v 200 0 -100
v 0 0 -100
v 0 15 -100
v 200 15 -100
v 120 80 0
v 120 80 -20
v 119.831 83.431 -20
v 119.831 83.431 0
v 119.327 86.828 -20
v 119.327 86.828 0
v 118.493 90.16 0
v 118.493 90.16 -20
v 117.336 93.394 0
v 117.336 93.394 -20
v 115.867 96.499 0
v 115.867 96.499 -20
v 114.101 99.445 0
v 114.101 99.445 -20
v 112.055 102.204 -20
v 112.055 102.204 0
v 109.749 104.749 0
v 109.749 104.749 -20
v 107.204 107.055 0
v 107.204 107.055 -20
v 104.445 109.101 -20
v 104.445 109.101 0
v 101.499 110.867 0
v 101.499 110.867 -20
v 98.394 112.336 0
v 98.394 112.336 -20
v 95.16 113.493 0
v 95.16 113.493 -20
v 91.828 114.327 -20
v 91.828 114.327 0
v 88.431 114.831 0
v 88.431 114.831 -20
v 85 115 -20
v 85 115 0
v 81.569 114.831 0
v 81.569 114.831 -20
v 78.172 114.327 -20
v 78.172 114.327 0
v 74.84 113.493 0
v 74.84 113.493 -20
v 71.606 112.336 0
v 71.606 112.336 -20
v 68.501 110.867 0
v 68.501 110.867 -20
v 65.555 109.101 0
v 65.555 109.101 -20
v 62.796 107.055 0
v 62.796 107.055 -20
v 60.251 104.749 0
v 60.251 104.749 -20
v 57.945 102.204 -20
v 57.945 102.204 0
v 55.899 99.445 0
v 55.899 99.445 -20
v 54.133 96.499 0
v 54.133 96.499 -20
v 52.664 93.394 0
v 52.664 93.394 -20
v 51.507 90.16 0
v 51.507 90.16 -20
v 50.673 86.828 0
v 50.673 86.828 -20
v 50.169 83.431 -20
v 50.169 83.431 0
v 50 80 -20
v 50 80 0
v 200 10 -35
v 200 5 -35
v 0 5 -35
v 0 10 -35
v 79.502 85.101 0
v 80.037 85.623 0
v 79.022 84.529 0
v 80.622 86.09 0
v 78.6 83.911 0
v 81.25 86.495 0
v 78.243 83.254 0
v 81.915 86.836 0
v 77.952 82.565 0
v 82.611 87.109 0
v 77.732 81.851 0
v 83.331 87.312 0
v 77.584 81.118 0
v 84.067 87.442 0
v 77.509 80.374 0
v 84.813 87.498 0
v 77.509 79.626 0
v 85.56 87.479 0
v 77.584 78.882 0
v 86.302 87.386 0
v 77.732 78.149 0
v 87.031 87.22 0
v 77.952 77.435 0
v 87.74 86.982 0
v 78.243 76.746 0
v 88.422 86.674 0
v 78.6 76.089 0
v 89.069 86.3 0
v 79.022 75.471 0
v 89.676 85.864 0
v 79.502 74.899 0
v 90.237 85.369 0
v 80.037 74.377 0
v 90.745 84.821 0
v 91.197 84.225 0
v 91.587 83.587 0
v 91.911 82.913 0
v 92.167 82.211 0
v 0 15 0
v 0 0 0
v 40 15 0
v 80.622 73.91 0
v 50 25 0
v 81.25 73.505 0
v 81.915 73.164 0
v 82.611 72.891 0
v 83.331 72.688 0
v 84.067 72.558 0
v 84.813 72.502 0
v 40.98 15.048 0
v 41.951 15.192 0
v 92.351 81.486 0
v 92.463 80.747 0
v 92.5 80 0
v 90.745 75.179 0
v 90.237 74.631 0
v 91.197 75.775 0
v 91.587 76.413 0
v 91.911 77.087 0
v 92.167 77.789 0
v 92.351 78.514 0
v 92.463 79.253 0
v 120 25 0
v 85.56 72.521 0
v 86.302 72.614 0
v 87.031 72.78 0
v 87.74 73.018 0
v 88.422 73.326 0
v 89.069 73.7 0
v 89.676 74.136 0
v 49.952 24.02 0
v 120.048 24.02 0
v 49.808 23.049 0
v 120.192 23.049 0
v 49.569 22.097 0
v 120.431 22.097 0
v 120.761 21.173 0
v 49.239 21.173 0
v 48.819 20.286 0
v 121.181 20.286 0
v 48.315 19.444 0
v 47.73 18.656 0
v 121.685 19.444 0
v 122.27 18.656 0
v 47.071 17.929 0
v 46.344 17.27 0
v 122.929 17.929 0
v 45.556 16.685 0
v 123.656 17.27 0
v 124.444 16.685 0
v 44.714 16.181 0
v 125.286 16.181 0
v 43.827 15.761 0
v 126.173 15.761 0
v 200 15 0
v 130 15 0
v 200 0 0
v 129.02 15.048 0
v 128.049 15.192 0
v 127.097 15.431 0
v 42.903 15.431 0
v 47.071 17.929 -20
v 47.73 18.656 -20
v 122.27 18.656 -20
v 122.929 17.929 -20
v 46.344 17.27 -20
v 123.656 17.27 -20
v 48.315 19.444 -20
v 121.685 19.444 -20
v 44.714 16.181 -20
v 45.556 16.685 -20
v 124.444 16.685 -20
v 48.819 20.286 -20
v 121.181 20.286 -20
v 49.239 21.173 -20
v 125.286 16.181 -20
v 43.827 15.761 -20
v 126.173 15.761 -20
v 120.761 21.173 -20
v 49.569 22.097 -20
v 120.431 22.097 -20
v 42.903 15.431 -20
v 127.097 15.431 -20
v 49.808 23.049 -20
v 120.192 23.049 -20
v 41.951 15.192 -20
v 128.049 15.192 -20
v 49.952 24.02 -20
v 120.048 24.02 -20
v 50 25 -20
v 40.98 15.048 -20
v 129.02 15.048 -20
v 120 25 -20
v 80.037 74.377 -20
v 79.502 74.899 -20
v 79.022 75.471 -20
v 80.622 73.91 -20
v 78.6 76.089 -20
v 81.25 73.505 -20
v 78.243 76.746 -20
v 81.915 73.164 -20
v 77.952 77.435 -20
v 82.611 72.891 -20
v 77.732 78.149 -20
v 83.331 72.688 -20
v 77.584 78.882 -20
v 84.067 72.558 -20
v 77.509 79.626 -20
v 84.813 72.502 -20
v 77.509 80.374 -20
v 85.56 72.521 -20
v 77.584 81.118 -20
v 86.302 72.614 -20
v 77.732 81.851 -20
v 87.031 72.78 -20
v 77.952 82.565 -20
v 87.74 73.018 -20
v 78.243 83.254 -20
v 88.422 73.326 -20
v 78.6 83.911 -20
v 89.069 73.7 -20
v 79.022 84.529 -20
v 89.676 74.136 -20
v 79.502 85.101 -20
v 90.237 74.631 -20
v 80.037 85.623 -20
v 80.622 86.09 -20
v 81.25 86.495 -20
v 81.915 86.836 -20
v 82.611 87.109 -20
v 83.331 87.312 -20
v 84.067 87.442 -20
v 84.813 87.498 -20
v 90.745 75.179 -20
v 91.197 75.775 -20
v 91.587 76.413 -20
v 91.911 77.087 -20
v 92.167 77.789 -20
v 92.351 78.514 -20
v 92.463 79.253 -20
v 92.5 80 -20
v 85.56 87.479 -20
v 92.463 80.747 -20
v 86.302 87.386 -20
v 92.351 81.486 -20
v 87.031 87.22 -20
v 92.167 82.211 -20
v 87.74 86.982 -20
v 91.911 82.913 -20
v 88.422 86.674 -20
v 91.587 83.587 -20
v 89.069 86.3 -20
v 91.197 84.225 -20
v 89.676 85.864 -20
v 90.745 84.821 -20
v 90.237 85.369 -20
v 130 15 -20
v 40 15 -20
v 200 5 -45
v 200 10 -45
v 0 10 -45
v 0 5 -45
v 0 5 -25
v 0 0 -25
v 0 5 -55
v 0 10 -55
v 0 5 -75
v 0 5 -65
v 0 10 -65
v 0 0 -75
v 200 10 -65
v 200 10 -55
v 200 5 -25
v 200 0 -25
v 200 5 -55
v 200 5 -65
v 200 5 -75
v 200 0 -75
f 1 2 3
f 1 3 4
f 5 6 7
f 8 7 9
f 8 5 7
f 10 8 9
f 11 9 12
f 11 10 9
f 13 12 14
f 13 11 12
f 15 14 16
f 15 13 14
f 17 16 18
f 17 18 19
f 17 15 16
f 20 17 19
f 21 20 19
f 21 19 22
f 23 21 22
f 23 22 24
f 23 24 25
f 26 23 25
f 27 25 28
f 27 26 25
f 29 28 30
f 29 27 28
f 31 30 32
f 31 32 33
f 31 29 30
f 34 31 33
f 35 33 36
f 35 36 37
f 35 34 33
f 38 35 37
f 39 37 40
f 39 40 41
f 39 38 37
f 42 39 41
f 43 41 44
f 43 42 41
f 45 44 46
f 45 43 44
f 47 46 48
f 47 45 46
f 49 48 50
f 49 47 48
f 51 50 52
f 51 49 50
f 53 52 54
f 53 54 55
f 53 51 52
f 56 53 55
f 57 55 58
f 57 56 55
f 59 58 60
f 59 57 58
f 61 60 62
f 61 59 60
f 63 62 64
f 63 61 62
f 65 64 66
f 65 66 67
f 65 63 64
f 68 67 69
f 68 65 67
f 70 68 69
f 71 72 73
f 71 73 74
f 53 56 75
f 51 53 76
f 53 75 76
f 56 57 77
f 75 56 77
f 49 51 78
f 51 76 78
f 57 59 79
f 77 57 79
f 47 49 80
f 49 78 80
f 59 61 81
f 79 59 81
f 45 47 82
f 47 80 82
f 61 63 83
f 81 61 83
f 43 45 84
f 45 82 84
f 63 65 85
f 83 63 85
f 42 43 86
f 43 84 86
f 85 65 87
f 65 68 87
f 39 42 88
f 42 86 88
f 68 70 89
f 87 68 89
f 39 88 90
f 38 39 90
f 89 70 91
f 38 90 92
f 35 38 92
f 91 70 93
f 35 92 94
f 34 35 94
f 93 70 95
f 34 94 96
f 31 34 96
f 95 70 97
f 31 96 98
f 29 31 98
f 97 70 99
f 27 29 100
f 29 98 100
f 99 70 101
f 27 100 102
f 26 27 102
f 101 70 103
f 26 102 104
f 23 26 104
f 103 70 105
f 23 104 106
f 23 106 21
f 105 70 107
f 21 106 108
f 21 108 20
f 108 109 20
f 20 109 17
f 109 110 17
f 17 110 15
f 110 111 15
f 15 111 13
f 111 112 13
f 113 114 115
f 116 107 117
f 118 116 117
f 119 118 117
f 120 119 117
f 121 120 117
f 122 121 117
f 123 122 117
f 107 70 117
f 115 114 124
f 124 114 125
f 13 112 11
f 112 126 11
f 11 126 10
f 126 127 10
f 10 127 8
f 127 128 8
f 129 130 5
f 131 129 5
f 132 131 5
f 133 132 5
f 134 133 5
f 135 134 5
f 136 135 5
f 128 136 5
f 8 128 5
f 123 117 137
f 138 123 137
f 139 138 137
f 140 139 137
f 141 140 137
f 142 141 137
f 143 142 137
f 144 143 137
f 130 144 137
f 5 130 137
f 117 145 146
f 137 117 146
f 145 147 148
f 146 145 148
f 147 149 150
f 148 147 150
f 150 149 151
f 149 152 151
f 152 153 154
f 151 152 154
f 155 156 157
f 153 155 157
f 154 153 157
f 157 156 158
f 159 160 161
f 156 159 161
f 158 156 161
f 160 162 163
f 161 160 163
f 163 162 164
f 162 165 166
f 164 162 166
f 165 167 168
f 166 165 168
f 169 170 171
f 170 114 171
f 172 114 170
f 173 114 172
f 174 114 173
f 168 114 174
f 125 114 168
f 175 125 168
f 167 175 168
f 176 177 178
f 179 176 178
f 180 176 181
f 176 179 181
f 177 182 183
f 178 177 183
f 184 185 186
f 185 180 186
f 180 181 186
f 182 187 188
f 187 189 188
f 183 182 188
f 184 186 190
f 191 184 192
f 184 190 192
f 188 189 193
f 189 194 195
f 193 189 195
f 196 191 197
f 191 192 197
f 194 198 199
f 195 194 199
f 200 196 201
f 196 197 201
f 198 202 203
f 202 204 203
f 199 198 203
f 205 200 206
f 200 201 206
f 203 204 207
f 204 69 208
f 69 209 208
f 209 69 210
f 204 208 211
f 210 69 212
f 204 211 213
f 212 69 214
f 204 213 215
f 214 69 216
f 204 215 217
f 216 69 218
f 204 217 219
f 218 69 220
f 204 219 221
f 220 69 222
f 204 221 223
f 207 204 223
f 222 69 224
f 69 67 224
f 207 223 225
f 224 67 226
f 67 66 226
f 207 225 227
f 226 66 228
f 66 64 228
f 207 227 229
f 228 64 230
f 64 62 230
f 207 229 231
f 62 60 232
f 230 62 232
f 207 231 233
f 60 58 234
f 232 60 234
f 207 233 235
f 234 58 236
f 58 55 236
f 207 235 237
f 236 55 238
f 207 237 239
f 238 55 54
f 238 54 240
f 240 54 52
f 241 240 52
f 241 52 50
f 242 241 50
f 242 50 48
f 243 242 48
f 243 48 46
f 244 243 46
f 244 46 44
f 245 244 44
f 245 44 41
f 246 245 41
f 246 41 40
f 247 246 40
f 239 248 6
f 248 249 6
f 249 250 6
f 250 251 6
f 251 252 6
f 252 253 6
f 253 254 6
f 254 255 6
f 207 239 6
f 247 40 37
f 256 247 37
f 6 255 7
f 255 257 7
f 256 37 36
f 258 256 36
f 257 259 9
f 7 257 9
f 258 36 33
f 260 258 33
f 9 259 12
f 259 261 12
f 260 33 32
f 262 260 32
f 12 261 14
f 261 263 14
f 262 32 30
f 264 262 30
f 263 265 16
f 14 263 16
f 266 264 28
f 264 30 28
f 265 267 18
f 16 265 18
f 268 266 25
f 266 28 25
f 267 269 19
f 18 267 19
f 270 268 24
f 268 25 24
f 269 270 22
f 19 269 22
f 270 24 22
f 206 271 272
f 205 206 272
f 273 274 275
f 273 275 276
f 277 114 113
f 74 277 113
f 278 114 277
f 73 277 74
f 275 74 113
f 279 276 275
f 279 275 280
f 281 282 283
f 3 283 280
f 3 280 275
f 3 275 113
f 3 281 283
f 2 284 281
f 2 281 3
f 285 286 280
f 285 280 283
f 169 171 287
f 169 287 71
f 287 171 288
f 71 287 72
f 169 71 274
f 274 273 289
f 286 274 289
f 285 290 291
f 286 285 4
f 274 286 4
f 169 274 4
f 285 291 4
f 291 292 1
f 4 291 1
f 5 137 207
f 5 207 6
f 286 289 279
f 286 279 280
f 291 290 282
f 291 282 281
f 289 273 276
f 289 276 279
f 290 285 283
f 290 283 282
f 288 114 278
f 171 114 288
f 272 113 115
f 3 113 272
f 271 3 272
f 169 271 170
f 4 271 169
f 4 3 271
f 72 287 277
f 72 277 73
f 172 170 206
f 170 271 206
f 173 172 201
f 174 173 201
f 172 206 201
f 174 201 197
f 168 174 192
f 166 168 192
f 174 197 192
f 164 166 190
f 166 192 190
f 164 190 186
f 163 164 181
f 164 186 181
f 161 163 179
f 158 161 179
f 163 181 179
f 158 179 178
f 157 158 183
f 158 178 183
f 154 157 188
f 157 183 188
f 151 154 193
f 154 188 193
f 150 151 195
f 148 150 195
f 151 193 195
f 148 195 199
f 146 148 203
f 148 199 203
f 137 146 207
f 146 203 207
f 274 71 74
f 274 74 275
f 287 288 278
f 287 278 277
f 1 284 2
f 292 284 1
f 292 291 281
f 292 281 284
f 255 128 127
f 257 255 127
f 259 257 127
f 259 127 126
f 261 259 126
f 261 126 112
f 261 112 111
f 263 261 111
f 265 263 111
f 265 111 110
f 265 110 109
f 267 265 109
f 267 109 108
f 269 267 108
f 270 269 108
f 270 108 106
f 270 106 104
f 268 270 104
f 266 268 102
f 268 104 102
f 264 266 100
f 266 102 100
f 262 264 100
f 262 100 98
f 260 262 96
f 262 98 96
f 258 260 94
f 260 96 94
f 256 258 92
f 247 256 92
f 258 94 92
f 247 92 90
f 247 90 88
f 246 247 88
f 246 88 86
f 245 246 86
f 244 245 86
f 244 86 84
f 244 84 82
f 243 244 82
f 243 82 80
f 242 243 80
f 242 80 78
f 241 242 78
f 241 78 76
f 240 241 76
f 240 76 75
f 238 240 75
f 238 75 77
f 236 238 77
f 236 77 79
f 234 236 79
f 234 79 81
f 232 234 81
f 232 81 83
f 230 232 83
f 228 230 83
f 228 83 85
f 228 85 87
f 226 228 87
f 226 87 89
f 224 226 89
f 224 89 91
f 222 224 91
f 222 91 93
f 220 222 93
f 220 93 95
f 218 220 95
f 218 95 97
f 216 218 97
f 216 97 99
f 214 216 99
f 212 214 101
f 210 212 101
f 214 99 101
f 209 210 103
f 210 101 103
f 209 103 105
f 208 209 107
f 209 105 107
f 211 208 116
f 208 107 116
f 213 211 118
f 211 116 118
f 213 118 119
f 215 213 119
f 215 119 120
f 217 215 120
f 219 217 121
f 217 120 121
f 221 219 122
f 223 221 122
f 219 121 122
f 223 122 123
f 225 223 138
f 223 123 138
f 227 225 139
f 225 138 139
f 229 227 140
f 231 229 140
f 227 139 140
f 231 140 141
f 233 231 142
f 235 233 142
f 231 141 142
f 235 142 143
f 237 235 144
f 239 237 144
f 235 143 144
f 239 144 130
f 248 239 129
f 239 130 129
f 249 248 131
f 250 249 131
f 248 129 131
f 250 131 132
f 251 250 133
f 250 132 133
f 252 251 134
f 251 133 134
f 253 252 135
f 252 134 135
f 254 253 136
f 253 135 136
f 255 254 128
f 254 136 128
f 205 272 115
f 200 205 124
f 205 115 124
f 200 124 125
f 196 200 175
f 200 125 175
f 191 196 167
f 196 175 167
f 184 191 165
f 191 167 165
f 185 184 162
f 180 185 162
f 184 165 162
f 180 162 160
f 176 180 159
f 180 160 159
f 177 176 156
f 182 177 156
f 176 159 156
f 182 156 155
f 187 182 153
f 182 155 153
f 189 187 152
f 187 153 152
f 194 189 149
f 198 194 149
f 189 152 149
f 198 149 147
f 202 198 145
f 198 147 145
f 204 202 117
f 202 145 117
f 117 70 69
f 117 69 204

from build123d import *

# Parameters (mm, degrees)
SKETCH_1_W          = 200
SKETCH_1_H          = 100
EXTRUDE_1_DEPTH     = 15
EXTRUDE_2_DEPTH     = 20
CUT_EXTRUDE_2_DEPTH = 201
SKETCH_4_R          = 7.5
CUT_EXTRUDE_3_DEPTH = 101
FILLET_2_R          = 10


with BuildPart() as part:
    # 스케치1 → 보스-돌출1 (new body)
    with BuildSketch(Plane(origin=(0, 0, 0), x_dir=(1, 0, 0), z_dir=(0, 1, 0))):
        with Locations((100, 50)):
            Rectangle(SKETCH_1_W, SKETCH_1_H)
    extrude(amount=EXTRUDE_1_DEPTH)

    # 스케치2 → 보스-돌출2 (add)
    with BuildSketch(Plane.XY):
        with BuildLine():
            Line((50, 0), (120, 0))
            Line((120, 0), (120, 80))
            ThreePointArc((120, 80), (85, 115), (50, 80))
            Line((50, 80), (50, 0))
        make_face()
    extrude(amount=-EXTRUDE_2_DEPTH)

    # 스케치3 → 컷-돌출2 (cut, through all)
    with BuildSketch(Plane(origin=(200, 0, 0), x_dir=(0, 0, -1), z_dir=(1, 0, 0))):
        Polygon((25, 0), (25, 5), (35, 5), (35, 10), (45, 10), (45, 5), (55, 5), (55, 10), (65, 10), (65, 5), (75, 5), (75, 0), align=None)
    extrude(amount=-CUT_EXTRUDE_2_DEPTH, mode=Mode.SUBTRACT)

    # 스케치4 → 컷-돌출3 (cut, through all)
    with BuildSketch(Plane.XY):
        with Locations((85, 80)):
            Circle(SKETCH_4_R)
    extrude(amount=-CUT_EXTRUDE_3_DEPTH, mode=Mode.SUBTRACT)

    # 필렛2
    fillet_2_edges = [part.edges().sort_by_distance(p)[0] for p in [
        (50, 15, -10),
        (120, 15, -10),
    ]]
    fillet(fillet_2_edges, radius=FILLET_2_R)


solid = part.part
